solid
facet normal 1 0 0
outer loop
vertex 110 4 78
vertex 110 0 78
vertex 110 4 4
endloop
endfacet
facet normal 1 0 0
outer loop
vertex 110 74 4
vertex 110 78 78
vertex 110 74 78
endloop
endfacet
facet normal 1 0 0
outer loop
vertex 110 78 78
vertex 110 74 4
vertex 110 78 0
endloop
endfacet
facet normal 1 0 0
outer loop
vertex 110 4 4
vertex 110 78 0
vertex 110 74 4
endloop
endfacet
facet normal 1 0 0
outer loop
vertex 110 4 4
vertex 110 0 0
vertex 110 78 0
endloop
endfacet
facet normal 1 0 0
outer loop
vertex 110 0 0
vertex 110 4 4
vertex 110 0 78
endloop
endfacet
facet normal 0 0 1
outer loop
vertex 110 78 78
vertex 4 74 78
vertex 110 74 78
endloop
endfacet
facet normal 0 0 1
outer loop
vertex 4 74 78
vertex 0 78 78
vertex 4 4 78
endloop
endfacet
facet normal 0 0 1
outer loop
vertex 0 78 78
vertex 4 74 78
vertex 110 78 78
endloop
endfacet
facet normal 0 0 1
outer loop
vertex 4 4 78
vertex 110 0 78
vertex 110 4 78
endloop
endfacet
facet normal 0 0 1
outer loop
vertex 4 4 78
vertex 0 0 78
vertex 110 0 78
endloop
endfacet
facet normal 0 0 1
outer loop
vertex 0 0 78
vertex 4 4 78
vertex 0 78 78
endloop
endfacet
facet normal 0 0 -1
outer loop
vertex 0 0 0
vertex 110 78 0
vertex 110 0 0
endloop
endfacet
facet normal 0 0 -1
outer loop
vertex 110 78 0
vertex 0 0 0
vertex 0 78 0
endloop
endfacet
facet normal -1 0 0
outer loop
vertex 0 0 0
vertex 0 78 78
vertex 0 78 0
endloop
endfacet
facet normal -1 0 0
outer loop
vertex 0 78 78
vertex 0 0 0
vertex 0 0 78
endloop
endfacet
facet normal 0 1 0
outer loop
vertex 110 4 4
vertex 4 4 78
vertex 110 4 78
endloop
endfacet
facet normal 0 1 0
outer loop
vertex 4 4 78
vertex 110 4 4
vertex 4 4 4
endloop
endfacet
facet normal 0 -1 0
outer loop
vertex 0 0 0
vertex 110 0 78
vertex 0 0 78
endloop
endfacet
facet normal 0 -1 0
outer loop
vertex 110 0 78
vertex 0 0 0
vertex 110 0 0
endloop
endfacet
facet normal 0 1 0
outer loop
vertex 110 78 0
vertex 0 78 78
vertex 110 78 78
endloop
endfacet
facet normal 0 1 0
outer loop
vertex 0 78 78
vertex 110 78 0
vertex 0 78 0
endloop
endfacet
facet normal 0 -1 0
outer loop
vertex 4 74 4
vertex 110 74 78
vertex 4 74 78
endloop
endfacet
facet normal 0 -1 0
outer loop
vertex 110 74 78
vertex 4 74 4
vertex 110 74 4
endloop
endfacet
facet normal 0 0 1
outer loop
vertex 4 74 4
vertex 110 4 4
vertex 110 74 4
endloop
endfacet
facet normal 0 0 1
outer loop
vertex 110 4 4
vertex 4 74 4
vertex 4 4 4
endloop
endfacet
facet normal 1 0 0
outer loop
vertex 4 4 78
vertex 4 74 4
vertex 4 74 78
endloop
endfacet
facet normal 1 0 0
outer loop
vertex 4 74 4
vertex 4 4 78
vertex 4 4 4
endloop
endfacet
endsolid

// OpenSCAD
// How many mm high is one unit
unitHeight = 110; // [10:500]
// How many mm wide is one unit
unitWidth = 70; // [10:500]
// How many mm deep is one unit
unitDepth = 70; // [10:500]
// Number of units high
heightInUnits = 1; // [1:4]
// Number of units wide
widthInUnits = 1; // [1:4]

module noop() {}

wallThickness = 4; // Do not make less than 2
pegThickness = 2;

// x = height
// y = width
// z = depth


module back() {
    cube([
        heightInUnits * unitHeight,
        widthInUnits * (unitWidth + (2*wallThickness)),
        wallThickness
    ]);
}


module wall() {
    color([1,0,0])
    cube([
        unitHeight*heightInUnits,
        wallThickness,
        unitDepth + (2*wallThickness),
    ]);
}

module left_wall() {
    wall();
}

module right_wall() {
    translate([
        0, 
        widthInUnits * (unitWidth + (2*wallThickness)) - wallThickness,
        0
    ])
    wall();
}

module top() {
    color([0,0,1])
    cube([
        wallThickness,
        widthInUnits * (unitWidth + (2*wallThickness)),
        unitDepth + (2*wallThickness)
    ]);
}

module shelf() {
    left_wall();
    right_wall();
    back();
    top();
}

shelf();
